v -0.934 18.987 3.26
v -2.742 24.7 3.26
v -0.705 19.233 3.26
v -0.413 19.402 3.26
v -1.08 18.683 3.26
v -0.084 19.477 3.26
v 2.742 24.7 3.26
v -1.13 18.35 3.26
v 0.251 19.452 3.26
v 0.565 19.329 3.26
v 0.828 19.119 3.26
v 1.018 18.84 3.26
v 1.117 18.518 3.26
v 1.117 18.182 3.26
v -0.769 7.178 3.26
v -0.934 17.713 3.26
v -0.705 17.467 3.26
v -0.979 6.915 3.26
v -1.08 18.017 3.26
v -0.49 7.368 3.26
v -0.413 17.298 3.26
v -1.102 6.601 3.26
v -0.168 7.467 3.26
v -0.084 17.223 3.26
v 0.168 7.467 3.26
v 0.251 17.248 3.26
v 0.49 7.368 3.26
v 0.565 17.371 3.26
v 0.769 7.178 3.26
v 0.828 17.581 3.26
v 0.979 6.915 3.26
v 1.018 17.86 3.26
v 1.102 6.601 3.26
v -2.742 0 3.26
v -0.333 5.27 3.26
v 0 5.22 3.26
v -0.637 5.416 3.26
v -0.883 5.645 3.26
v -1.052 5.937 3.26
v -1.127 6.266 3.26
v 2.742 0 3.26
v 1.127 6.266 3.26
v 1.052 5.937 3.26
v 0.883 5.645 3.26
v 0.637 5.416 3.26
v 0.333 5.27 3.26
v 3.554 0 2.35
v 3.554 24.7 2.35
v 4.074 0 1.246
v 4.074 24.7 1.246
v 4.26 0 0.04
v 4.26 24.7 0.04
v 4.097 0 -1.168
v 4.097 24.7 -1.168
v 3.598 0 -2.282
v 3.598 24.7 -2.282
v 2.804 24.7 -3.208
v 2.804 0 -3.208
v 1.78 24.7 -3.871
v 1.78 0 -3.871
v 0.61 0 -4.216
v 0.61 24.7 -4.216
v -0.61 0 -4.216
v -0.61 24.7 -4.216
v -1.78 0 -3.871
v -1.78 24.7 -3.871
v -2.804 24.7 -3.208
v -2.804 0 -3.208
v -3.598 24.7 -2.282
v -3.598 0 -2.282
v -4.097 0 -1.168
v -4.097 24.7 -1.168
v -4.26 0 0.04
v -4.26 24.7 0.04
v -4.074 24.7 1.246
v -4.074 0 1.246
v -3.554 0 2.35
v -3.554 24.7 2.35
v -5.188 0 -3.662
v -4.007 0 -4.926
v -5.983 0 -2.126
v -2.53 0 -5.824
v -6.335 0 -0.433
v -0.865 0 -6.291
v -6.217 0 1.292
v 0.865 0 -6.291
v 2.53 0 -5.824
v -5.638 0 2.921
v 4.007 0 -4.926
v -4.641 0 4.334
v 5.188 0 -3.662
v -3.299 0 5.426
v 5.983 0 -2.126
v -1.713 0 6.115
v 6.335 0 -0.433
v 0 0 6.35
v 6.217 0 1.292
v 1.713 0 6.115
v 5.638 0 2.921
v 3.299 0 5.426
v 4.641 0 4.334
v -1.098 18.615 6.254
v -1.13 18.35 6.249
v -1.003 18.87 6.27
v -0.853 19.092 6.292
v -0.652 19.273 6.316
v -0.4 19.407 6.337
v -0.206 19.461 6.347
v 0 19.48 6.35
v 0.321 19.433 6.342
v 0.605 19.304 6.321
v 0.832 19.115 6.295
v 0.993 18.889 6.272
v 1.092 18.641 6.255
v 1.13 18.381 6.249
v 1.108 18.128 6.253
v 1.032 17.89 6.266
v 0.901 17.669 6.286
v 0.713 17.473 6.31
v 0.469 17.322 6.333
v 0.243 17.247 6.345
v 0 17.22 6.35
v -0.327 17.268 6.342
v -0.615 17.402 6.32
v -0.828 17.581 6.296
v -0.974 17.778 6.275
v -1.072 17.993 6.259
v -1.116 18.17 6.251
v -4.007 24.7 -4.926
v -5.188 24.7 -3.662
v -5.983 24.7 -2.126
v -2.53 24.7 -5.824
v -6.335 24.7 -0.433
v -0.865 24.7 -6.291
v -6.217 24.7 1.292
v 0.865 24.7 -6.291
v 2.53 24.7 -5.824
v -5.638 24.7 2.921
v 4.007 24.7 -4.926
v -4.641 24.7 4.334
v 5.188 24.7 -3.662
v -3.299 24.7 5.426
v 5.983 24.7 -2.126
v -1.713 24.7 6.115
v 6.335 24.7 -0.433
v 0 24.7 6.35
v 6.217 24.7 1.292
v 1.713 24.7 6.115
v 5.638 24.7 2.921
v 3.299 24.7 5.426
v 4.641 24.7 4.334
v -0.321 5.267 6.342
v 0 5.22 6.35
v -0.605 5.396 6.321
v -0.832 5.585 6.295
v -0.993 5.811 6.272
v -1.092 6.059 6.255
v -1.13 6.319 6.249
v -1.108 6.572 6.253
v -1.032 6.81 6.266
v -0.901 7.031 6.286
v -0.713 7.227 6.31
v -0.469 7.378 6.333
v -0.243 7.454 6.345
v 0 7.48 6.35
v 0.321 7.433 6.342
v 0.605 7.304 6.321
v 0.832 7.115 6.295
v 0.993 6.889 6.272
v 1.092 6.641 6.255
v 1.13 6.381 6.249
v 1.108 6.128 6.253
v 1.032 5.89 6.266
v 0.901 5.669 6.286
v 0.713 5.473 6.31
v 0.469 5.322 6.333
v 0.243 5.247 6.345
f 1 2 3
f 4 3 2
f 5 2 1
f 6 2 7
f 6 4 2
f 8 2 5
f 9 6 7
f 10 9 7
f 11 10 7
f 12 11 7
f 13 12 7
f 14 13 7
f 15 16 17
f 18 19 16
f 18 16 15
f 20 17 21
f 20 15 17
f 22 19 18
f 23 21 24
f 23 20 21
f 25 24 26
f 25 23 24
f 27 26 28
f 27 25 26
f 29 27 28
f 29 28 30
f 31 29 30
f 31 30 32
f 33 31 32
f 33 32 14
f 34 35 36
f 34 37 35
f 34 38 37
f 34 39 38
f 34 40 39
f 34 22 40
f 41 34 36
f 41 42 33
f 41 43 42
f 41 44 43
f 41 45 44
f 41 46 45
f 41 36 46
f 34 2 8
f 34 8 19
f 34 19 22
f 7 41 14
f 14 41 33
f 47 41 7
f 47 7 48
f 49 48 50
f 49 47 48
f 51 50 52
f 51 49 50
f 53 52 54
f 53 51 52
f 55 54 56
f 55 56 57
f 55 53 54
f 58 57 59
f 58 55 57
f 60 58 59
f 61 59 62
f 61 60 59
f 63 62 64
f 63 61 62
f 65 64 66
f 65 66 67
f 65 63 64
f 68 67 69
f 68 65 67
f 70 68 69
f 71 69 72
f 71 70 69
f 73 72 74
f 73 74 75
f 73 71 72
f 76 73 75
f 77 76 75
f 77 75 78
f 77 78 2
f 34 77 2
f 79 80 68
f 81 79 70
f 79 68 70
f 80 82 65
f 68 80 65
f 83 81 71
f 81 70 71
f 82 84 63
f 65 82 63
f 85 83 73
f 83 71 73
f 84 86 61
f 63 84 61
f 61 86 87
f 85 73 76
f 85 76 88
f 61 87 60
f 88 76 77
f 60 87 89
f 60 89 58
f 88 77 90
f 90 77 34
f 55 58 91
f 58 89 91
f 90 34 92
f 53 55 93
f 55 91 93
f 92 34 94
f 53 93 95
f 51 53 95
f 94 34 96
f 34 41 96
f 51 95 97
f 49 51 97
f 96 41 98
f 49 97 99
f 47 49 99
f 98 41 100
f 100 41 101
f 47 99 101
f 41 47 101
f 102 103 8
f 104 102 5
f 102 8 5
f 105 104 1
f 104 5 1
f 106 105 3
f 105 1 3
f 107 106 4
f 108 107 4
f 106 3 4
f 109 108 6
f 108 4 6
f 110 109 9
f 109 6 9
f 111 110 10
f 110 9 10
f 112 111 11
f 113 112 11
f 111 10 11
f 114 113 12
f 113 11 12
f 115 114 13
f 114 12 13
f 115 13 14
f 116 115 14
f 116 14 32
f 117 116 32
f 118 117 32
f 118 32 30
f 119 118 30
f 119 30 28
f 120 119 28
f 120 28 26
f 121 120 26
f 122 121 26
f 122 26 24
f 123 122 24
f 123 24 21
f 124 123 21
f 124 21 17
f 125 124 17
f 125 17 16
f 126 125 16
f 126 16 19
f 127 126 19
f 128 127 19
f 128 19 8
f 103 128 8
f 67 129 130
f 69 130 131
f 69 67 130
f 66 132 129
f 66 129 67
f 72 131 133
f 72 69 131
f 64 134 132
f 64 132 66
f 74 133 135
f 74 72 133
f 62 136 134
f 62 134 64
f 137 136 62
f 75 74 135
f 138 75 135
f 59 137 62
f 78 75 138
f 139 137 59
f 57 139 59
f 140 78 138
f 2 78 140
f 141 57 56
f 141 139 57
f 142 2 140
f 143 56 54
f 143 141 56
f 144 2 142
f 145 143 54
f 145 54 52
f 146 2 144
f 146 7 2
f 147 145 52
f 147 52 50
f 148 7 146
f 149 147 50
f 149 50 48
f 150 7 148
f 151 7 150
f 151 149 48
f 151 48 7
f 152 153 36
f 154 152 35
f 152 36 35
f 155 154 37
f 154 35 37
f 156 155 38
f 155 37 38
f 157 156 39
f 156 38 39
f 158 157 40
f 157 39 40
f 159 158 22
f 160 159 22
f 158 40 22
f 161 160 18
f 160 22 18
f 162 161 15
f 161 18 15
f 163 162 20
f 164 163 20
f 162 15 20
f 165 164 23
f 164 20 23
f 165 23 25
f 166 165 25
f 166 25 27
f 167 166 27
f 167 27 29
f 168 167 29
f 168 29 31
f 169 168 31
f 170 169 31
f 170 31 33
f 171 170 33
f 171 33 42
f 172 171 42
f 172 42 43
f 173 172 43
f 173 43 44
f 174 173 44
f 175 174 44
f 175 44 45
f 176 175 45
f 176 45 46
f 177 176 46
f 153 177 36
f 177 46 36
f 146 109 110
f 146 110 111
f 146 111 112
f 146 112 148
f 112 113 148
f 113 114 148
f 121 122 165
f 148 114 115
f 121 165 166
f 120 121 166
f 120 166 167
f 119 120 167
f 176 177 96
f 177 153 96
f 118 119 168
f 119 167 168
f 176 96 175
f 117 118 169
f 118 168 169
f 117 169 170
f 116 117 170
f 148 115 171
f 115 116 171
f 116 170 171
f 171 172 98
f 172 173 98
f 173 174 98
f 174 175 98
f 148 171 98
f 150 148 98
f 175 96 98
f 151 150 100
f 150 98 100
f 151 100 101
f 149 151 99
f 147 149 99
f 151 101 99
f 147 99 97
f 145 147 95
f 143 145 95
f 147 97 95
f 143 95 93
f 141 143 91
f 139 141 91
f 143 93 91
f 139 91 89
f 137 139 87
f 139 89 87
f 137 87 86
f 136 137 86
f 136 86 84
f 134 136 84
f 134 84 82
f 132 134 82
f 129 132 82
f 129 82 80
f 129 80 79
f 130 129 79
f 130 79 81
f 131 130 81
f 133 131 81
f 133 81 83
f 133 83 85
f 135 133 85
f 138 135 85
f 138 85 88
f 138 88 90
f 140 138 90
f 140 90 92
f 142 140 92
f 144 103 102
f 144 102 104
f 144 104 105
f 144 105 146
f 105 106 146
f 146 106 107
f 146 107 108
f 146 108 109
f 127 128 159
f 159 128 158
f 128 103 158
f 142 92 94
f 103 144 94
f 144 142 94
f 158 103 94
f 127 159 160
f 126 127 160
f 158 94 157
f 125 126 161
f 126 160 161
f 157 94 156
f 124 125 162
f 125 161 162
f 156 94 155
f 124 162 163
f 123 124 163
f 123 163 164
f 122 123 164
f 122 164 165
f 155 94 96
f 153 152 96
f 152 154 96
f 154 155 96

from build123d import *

# Parameters (mm, degrees)
SKETCH1_R           = 6.35
BOSS_EXTRUDE1_DEPTH = 24.7
SKETCH3_R           = 1.13
CUT_EXTRUDE1_DEPTH  = 28.253825364


with BuildPart() as part:
    # Sketch1 → Boss-Extrude1 (new body)
    with BuildSketch(Plane(origin=(0, 0, 0), x_dir=(1, 0, 0), z_dir=(0, 1, 0))):
        with Locations(Location((0, 0, 0), (0, 0, 270))):
            Circle(SKETCH1_R)
        with BuildLine():
            Line((-2.742383206, -3.260332823), (2.742383206, -3.260332823))
            ThreePointArc((2.742383206, -3.260332823), (0, 4.260332823), (-2.742383206, -3.260332823))
        make_face(mode=Mode.SUBTRACT)
    extrude(amount=BOSS_EXTRUDE1_DEPTH)

    # Sketch3 → Cut-Extrude1 (cut, through all)
    with BuildSketch(Plane(origin=(0, 0, 3.260332823), x_dir=(-1, 0, 0), z_dir=(0, 0, -1))):
        with Locations((0, 18.35)):
            Circle(SKETCH3_R)
        with Locations(Location((0, 6.35, 0), (0, 0, 270))):
            Circle(SKETCH3_R)
    extrude(amount=-CUT_EXTRUDE1_DEPTH, mode=Mode.SUBTRACT)


solid = part.part
